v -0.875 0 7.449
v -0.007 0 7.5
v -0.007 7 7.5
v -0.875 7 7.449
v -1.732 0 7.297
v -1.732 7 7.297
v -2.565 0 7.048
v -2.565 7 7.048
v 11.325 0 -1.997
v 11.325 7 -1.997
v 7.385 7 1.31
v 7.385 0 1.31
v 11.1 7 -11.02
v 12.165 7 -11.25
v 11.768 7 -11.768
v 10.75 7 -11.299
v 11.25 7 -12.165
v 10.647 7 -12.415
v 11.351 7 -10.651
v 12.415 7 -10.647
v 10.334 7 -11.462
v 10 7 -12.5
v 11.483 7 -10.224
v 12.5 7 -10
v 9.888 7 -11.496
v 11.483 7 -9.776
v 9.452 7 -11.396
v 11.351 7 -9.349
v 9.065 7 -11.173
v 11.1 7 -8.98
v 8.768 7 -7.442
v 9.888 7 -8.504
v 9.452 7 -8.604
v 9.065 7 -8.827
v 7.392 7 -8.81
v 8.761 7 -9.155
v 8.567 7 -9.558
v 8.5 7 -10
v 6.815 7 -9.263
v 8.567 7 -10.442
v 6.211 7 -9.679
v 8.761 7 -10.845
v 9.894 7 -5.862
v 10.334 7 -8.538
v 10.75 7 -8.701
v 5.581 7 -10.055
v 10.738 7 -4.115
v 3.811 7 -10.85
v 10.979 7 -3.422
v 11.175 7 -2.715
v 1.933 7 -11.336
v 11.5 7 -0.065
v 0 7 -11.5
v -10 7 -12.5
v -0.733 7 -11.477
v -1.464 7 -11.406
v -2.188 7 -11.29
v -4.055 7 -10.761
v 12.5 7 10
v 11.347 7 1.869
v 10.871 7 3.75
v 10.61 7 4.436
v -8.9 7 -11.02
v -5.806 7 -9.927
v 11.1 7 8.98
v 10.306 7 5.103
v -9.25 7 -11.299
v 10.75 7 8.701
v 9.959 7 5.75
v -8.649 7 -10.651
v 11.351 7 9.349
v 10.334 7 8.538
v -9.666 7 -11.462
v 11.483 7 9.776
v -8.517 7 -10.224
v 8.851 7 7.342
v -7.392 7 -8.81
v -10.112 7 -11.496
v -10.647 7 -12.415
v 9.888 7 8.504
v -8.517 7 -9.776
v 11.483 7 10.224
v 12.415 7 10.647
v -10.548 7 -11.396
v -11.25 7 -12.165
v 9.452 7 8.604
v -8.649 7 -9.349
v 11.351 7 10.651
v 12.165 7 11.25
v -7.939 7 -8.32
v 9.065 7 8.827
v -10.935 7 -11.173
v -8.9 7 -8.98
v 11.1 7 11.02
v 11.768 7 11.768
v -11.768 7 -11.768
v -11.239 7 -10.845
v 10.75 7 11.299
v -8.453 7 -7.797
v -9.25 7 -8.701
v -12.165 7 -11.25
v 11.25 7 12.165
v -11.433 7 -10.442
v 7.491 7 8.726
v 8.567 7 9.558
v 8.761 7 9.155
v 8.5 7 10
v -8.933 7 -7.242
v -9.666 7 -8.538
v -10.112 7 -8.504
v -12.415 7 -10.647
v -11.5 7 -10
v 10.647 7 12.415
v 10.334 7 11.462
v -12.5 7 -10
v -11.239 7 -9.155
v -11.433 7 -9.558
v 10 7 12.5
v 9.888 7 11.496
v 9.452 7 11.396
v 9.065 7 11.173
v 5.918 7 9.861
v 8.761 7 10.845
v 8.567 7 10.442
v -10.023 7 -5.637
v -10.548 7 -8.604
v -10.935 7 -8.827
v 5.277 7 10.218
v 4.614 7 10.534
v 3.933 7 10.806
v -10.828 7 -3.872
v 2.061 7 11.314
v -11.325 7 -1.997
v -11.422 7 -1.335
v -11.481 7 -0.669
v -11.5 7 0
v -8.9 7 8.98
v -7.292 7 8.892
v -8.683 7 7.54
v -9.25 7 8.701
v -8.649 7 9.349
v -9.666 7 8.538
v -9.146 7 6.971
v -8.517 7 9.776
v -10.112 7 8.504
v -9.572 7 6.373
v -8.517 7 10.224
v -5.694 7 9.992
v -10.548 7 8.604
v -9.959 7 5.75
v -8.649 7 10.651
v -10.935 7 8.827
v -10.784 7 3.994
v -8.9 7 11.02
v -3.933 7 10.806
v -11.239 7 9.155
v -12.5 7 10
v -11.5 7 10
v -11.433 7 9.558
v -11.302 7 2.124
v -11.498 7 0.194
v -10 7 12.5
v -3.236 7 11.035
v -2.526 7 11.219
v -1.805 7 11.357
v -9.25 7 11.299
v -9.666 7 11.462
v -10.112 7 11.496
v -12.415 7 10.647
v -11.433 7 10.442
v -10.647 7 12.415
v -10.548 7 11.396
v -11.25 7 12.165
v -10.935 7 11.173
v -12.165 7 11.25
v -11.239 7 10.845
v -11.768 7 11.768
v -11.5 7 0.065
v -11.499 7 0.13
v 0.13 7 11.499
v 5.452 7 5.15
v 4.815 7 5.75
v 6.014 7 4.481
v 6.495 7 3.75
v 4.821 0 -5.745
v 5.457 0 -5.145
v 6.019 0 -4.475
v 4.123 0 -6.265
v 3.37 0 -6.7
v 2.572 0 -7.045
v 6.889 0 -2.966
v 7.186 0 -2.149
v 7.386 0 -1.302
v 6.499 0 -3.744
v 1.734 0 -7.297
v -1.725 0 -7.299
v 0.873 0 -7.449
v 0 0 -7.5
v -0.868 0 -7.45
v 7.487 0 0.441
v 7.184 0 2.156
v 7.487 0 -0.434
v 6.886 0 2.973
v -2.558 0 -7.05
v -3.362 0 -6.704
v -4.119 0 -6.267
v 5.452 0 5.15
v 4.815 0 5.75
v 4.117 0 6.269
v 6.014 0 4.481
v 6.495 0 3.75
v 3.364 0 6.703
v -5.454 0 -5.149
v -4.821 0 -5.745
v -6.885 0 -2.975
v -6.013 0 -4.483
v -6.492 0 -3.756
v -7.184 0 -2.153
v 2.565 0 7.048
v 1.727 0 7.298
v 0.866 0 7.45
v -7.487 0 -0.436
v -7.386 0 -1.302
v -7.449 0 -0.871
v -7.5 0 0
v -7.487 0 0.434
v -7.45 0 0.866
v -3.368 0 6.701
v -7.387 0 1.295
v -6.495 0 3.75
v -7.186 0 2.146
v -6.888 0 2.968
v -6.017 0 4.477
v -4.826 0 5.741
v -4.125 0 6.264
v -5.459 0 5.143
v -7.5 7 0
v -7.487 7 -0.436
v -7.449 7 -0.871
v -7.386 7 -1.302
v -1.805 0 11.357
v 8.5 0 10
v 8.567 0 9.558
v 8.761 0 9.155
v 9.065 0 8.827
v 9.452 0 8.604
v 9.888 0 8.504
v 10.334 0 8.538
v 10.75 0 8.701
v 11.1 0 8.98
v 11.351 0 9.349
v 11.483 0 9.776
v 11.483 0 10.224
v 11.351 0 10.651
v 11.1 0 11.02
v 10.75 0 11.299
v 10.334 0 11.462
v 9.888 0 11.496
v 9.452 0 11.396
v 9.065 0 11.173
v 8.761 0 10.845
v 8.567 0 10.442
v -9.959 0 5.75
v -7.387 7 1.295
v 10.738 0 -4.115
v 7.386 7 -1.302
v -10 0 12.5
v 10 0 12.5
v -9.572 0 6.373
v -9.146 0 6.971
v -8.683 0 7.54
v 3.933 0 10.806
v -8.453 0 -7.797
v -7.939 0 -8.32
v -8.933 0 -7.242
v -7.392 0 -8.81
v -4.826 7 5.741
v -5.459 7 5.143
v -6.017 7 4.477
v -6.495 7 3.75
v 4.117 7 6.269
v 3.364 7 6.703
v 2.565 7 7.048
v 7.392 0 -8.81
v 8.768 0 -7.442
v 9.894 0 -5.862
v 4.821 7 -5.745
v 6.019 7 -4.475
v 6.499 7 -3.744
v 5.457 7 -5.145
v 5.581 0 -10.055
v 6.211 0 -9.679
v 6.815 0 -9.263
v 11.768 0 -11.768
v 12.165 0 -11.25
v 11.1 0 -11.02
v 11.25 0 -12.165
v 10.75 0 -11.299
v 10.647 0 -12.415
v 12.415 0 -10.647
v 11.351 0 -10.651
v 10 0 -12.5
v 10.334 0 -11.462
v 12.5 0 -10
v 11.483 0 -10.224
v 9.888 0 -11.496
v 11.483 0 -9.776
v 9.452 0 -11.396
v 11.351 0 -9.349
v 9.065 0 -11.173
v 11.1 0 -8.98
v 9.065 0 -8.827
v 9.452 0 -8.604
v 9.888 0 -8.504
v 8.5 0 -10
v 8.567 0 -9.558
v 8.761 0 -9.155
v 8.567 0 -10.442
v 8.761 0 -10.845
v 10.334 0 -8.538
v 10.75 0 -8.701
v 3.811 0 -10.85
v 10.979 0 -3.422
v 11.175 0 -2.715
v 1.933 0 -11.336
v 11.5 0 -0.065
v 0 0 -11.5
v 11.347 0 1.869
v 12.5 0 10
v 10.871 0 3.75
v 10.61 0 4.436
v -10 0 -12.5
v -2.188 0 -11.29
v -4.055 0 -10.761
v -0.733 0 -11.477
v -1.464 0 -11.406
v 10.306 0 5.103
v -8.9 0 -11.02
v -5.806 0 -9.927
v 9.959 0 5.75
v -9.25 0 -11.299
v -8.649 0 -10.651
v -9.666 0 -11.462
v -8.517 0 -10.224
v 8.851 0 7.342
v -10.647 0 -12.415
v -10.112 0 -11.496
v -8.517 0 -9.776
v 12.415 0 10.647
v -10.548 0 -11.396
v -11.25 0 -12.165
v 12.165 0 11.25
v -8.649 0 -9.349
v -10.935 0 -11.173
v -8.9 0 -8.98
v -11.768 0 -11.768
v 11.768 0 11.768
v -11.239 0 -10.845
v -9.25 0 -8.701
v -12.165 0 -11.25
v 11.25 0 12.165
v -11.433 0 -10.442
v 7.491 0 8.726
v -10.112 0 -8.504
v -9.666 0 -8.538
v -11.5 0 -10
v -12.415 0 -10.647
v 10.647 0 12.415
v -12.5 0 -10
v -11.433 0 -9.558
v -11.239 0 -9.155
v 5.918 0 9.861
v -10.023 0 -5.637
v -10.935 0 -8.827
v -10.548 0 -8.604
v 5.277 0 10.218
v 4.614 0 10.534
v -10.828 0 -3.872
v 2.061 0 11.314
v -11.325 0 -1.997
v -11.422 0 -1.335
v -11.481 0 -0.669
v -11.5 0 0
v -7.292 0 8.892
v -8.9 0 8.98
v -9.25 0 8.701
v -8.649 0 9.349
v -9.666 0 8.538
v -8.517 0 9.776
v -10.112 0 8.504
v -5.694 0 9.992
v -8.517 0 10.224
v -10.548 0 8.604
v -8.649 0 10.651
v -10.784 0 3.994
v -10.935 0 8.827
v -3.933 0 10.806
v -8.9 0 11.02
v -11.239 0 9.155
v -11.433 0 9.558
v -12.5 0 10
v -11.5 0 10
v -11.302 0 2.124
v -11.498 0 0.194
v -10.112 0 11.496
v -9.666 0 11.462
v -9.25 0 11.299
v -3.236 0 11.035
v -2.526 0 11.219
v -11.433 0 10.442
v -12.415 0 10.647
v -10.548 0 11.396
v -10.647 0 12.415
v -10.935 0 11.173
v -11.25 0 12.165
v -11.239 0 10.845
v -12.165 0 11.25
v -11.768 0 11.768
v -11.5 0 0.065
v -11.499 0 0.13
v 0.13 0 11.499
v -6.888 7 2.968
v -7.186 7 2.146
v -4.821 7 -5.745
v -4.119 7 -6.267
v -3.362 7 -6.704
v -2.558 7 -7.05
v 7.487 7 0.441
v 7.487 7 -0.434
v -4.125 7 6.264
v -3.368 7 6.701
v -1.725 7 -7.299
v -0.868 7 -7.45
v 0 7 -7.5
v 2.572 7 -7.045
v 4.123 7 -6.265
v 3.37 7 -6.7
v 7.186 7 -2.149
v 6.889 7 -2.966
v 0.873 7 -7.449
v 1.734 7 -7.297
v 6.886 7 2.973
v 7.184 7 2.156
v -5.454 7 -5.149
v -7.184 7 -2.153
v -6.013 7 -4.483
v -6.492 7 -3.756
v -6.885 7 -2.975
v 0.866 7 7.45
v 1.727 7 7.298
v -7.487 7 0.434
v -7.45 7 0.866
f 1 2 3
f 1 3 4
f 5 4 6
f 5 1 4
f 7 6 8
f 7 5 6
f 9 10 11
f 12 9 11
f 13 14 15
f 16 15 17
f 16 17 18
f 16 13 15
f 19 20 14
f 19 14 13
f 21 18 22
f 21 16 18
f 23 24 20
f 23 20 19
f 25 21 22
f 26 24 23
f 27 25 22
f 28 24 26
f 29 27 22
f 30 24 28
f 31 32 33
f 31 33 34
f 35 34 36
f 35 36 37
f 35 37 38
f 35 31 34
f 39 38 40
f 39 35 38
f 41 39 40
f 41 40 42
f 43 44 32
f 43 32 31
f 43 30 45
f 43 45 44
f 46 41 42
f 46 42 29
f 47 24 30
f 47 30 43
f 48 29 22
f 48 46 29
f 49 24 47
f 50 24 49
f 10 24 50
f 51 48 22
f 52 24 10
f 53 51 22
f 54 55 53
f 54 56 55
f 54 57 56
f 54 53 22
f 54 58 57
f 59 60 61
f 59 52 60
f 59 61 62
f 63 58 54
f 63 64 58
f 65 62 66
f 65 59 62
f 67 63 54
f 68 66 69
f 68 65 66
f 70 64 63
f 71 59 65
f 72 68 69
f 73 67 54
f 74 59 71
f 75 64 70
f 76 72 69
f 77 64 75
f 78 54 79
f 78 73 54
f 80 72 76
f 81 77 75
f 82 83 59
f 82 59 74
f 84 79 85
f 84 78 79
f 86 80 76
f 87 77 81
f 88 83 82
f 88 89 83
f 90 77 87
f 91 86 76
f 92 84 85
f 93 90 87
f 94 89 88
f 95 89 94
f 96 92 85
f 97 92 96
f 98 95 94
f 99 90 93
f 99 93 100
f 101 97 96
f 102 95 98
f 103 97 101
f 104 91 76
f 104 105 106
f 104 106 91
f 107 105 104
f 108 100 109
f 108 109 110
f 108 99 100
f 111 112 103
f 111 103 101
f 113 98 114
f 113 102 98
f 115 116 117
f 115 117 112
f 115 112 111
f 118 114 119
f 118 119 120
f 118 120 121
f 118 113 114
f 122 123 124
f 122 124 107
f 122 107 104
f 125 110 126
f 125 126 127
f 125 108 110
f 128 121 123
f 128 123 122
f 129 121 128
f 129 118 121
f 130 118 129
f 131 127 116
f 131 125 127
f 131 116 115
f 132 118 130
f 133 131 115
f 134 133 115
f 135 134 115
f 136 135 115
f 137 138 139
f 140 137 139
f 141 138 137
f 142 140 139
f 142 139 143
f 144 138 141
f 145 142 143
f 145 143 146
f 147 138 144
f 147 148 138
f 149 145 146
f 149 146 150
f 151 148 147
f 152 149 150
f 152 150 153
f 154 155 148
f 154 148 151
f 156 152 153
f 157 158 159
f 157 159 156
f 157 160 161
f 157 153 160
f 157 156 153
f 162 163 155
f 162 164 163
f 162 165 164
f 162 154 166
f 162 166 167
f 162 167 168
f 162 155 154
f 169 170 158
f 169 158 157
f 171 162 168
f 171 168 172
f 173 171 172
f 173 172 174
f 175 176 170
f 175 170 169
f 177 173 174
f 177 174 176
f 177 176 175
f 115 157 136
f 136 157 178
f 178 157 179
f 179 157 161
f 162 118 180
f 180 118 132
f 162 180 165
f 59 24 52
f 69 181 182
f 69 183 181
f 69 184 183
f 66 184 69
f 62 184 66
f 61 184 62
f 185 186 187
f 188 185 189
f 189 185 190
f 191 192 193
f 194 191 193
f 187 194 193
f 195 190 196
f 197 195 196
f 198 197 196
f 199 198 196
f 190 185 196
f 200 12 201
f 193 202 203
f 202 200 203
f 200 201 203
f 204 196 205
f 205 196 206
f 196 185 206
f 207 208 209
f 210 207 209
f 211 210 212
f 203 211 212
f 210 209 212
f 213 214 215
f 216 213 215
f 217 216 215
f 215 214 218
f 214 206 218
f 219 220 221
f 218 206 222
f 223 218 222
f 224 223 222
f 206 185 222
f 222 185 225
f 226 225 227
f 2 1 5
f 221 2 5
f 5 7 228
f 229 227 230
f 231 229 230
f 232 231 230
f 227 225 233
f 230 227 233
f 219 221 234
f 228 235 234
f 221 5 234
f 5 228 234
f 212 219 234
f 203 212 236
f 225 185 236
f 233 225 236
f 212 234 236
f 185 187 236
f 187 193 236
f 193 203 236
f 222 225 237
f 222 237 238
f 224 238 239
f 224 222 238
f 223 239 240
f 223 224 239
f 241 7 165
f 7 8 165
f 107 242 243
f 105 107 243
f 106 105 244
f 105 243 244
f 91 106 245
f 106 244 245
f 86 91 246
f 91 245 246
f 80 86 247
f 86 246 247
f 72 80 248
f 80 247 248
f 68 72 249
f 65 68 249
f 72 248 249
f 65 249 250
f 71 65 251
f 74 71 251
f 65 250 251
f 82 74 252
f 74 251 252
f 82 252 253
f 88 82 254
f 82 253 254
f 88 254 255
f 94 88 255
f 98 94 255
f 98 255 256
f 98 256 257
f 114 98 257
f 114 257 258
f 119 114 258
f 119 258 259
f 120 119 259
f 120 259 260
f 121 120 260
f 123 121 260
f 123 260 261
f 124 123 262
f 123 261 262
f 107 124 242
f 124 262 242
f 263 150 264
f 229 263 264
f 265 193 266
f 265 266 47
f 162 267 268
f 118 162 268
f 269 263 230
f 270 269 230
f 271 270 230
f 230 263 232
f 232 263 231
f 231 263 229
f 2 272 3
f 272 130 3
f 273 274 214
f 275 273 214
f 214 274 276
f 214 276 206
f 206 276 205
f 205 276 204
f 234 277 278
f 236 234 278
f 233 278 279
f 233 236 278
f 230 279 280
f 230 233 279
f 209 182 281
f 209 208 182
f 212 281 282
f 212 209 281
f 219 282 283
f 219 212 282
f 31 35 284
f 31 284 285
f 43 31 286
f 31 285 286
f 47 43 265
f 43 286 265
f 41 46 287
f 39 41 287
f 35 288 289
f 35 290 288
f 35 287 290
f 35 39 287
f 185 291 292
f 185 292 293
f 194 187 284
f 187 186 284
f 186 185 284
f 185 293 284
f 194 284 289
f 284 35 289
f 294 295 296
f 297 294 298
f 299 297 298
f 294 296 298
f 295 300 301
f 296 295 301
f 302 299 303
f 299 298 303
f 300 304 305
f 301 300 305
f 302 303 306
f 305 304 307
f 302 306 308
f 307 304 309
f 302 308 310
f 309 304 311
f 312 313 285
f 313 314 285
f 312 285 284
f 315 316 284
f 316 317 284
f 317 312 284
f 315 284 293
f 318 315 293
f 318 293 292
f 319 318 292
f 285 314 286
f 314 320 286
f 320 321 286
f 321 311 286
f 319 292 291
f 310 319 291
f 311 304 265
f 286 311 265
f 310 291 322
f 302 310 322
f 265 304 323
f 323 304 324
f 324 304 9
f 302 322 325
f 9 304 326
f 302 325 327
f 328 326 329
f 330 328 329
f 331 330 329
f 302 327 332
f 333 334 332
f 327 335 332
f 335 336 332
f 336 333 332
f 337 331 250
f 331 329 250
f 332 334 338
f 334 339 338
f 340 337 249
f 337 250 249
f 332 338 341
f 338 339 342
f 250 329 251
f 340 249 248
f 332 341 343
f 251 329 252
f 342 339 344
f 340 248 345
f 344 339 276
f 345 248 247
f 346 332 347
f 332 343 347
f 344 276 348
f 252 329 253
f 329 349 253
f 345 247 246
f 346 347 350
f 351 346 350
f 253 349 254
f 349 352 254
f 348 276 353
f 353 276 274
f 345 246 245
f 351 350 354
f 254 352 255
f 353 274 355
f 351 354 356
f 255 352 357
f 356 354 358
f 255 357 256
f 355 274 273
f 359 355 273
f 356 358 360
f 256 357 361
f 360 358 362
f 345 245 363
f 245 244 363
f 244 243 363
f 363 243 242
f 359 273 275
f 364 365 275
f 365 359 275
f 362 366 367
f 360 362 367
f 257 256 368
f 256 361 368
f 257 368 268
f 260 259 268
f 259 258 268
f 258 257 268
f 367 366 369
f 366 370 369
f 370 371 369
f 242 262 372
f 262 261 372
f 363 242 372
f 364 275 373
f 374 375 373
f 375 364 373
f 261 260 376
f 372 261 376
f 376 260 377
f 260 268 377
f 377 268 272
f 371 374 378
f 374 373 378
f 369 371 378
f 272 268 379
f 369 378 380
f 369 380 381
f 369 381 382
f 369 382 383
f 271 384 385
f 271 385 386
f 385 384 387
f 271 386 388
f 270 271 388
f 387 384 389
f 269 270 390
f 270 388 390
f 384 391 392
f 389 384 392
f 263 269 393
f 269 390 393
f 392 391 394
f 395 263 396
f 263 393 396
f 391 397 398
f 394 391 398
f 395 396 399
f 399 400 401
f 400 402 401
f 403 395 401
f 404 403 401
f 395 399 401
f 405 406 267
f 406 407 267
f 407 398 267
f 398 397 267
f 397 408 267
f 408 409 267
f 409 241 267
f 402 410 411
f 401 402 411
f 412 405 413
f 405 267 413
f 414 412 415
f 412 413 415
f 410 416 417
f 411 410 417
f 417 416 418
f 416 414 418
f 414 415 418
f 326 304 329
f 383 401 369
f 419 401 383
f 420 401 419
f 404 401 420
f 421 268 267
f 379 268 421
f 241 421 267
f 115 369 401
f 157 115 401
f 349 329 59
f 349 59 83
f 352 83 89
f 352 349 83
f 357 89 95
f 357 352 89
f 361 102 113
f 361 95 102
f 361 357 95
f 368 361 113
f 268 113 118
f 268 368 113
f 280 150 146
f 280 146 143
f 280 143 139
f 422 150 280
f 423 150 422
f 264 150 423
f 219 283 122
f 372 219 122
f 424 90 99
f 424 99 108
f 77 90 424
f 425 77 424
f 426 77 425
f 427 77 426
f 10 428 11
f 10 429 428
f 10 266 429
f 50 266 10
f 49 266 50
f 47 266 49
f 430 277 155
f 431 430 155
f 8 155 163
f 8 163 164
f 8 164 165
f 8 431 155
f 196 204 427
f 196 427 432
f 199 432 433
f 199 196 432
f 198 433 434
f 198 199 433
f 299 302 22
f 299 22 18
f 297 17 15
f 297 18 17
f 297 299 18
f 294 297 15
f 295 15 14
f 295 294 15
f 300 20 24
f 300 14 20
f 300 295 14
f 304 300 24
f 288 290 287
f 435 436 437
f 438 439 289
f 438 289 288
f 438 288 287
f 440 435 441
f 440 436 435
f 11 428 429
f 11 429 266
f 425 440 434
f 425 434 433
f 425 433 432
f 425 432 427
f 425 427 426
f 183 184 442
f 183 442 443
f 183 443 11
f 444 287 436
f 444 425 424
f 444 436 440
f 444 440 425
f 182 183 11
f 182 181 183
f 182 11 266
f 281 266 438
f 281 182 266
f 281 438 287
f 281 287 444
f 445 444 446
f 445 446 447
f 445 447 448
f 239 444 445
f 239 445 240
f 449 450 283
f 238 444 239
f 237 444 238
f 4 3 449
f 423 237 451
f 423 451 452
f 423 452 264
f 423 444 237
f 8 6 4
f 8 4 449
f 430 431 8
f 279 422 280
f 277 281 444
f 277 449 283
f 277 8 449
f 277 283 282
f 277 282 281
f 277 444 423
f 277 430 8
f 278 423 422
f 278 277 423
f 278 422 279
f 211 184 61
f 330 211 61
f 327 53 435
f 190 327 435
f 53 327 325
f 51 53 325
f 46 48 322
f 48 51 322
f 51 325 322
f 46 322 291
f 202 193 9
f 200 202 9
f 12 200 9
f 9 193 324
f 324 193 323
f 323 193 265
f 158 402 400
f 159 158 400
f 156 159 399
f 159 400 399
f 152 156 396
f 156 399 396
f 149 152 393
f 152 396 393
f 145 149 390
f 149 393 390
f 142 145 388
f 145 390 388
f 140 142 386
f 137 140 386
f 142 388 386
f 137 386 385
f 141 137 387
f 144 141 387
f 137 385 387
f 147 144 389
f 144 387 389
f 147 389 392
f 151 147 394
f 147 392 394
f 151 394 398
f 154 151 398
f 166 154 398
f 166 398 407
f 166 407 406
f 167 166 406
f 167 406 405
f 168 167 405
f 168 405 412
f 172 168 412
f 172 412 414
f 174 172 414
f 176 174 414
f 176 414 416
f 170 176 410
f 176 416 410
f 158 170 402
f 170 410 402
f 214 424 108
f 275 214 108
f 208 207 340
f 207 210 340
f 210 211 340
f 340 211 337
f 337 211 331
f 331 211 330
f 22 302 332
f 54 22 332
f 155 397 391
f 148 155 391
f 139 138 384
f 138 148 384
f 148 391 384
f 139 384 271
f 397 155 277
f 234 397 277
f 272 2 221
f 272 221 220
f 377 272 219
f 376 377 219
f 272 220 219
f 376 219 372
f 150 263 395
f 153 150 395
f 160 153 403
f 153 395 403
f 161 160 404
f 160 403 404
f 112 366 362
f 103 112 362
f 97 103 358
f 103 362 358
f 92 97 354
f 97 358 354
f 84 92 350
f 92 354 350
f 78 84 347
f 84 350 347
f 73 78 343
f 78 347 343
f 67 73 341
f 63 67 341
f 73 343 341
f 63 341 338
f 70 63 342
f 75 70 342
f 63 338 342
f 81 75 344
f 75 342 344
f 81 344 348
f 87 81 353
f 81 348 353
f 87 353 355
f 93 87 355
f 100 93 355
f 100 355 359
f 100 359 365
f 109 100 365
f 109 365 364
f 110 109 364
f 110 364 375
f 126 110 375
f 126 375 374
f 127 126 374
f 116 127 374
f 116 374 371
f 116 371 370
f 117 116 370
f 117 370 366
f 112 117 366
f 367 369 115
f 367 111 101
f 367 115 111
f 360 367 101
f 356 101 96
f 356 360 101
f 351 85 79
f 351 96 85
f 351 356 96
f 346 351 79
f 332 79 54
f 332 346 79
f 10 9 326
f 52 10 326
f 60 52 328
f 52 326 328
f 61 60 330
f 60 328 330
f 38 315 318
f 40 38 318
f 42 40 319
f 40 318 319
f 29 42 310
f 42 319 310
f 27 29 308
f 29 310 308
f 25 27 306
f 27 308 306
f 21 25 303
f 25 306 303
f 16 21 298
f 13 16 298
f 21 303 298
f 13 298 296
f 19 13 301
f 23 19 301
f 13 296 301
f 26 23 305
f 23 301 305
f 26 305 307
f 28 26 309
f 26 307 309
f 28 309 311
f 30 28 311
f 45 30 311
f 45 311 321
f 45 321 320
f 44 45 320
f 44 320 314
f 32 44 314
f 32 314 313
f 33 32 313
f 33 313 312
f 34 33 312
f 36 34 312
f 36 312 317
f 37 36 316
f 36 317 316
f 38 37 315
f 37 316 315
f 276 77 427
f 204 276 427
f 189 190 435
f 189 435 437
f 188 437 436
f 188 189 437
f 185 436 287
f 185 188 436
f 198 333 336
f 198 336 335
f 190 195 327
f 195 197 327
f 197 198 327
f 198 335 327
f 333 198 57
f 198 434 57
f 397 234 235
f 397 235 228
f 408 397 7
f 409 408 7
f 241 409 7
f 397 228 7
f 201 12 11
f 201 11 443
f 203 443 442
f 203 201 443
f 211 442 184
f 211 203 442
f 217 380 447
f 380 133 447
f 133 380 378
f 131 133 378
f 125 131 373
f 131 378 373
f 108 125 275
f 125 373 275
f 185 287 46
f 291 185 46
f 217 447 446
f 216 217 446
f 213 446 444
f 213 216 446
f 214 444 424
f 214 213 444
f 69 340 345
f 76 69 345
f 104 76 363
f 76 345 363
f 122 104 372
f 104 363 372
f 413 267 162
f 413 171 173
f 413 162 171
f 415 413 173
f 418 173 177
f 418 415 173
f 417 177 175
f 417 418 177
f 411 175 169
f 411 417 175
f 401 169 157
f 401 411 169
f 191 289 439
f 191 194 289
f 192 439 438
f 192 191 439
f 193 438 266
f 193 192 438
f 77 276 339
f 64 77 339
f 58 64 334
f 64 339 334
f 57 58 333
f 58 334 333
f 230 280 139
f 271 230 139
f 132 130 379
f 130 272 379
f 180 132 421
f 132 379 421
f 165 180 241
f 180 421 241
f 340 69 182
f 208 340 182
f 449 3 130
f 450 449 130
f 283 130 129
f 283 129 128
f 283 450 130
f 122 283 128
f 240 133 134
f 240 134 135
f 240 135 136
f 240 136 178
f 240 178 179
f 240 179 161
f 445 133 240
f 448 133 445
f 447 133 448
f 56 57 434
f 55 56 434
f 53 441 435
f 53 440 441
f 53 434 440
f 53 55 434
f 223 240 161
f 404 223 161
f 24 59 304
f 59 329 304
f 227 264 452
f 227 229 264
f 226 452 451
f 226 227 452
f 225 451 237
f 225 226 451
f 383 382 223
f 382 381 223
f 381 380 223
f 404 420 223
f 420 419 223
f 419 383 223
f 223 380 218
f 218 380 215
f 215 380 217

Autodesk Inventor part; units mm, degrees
ref_plane "YZ Plane" through (0, 0, 0) normal (1, 0, 0) x (0, 1, 0)
ref_plane "XZ Plane" through (0, 0, 0) normal (0, 1, 0) x (-1, 0, 0)
ref_plane "XY Plane" through (0, 0, 0) normal (0, 0, 1) x (1, 0, 0)
sketch "スケッチ1" plane through (0, 0, 0) normal (0, 1, 0) x (-1, 0, 0)
  line L0 (12.5, 12.5) -> (-12.5, 12.5)
  line L1 (-12.5, 12.5) -> (-12.5, -12.5)
  line L2 (-12.5, -12.5) -> (12.5, -12.5)
  line L3 (12.5, -12.5) -> (12.5, 12.5)
  line L4 (10, -10) -> (-10, -10)
  line L5 (-10, -10) -> (-10, 10)
  line L6 (-10, 10) -> (10, 10)
  line L7 (10, 10) -> (10, -10)
  circle A0 centre (10, -10) radius 1.5
  circle A1 centre (-10, -10) radius 1.5
  circle A2 centre (-10, 10) radius 1.5
  circle A3 centre (10, 10) radius 1.5
  circle A4 centre (10, 10) radius 2.5
  circle A5 centre (-10, 10) radius 2.5
  circle A6 centre (-10, -10) radius 2.5
  circle A7 centre (10, -10) radius 2.5
  circle A8 centre (0, 0) radius 11.5
  circle A9 centre (0, 0) radius 7.5
  point P0 (12.5, 0)
  point P1 (0, -12.5)
  point P2 (-10, 0)
  point P3 (-12.5, 0)
  point P4 (0, -10)
  point P5 (12.5, 10)
  point P6 (10, 12.5)
  point P7 (-10, 12.5)
  point P8 (-12.5, 10)
  point P9 (-12.5, -10)
  point P10 (-10, -12.5)
  point P11 (10, -12.5)
  point P12 (12.5, -10)
  point P13 (-5.6789, 10)
  point P14 (5.6789, 10)
  dimension "d0" = 25
  dimension "d1" = 25
  dimension "d2" = 20
  dimension "d3" = 20
  dimension "d4" = 3
  dimension "d5" = 3
  dimension "d6" = 3
  dimension "d7" = 3
  dimension "d8" = 23
  dimension "d9" = 15
extrude "押し出し1" add sketch "スケッチ1" along normal blind 7 contours A4 L6 A8 A5 L0 | A4 L7 A3 L6 | L3 A7 L7 A8 A4 | A5 L6 A2 L5 | A4 L7 A8 L6 | L6 A3 L7 A4 | A7 L4 A0 L7 | A5 L5 A2 L6 | L6 A8 L5 A5 | A5 L5 A8 A6 L1 | A7 L4 A8 L7 | L7 A0 L4 A7 | L2 A6 L4 A8 A7 | A6 L5 A1 L4 | A6 L4 A1 L5 | L5 A8 L4 A6 | A9
sketch "スケッチ2" plane through (0, 7, 0) normal (0, 1, 0) x (1, 0, 0)
  circle A0 centre (0, 0) radius 7.5 projected
  circle A1 centre (0, 0) radius 11.5 projected
  line L0 (0, 7.5) -> (-2.1881, 11.2899)
  line L1 (0, 7.5) -> (4.3762, 7.5) construction
  line L2 (0, 11.5) -> (3.4783, 5.4754)
  line L3 (0, 11.5) -> (6.9566, 11.5) construction
  line L4 (-4.8209, 5.7453) -> (-8.9332, 7.2421)
  line L5 (-7.3921, 8.8095) -> (-0.855, 6.4302)
  line L6 (-7.3861, 1.3024) -> (-11.4984, -0.1944)
  line L7 (-11.3253, 1.997) -> (-4.7882, 4.3763)
  line L8 (-6.4952, -3.75) -> (-8.6833, -7.5399)
  line L9 (-9.9593, -5.75) -> (-6.481, 0.2746)
  line L10 (-2.5652, -7.0477) -> (-1.8052, -11.3574)
  line L11 (-3.9332, -10.8065) -> (-5.1412, -3.9555)
  line L12 (2.5652, -7.0477) -> (5.9175, -9.8607)
  line L13 (3.9332, -10.8065) -> (-1.3958, -6.3348)
  line L14 (6.4952, -3.75) -> (10.8714, -3.75)
  line L15 (9.9593, -5.75) -> (3.0027, -5.75)
  line L16 (7.3861, 1.3024) -> (10.7384, 4.1153)
  line L17 (11.3253, 1.997) -> (5.9962, -2.4747)
  line L18 (4.8209, 5.7453) -> (5.5808, 10.0551)
  line L19 (7.3921, 8.8095) -> (6.1841, 1.9586)
  point P0 (-2.5583, 7.0502)
  point P1 (-6.4916, 3.7563)
  point P2 (-7.3873, -1.2952)
  point P3 (-4.8265, -5.7407)
  point P4 (-0.0073, -7.5)
  point P5 (4.8153, -5.75)
  point P6 (7.3848, -1.3095)
  point P7 (6.4988, 3.7437)
  point P8 (2.572, 7.0452)
  dimension "d12" = 120
  dimension "d13" = 60
  dimension "d16" = 360
extrude "押し出し2" add sketch "スケッチ2" against normal up to surface (7 mm away) contours A0 L16 A1 L17 | A0 L18 A1 L19 | L14 A1 L15 A0 | A0 L0 A1 L2 | L12 A1 L13 A0 | A0 L4 A1 L5 | L10 A1 L11 A0 | A0 L6 A1 L7 | L8 A1 L9 A0
properties part number "Fan"
